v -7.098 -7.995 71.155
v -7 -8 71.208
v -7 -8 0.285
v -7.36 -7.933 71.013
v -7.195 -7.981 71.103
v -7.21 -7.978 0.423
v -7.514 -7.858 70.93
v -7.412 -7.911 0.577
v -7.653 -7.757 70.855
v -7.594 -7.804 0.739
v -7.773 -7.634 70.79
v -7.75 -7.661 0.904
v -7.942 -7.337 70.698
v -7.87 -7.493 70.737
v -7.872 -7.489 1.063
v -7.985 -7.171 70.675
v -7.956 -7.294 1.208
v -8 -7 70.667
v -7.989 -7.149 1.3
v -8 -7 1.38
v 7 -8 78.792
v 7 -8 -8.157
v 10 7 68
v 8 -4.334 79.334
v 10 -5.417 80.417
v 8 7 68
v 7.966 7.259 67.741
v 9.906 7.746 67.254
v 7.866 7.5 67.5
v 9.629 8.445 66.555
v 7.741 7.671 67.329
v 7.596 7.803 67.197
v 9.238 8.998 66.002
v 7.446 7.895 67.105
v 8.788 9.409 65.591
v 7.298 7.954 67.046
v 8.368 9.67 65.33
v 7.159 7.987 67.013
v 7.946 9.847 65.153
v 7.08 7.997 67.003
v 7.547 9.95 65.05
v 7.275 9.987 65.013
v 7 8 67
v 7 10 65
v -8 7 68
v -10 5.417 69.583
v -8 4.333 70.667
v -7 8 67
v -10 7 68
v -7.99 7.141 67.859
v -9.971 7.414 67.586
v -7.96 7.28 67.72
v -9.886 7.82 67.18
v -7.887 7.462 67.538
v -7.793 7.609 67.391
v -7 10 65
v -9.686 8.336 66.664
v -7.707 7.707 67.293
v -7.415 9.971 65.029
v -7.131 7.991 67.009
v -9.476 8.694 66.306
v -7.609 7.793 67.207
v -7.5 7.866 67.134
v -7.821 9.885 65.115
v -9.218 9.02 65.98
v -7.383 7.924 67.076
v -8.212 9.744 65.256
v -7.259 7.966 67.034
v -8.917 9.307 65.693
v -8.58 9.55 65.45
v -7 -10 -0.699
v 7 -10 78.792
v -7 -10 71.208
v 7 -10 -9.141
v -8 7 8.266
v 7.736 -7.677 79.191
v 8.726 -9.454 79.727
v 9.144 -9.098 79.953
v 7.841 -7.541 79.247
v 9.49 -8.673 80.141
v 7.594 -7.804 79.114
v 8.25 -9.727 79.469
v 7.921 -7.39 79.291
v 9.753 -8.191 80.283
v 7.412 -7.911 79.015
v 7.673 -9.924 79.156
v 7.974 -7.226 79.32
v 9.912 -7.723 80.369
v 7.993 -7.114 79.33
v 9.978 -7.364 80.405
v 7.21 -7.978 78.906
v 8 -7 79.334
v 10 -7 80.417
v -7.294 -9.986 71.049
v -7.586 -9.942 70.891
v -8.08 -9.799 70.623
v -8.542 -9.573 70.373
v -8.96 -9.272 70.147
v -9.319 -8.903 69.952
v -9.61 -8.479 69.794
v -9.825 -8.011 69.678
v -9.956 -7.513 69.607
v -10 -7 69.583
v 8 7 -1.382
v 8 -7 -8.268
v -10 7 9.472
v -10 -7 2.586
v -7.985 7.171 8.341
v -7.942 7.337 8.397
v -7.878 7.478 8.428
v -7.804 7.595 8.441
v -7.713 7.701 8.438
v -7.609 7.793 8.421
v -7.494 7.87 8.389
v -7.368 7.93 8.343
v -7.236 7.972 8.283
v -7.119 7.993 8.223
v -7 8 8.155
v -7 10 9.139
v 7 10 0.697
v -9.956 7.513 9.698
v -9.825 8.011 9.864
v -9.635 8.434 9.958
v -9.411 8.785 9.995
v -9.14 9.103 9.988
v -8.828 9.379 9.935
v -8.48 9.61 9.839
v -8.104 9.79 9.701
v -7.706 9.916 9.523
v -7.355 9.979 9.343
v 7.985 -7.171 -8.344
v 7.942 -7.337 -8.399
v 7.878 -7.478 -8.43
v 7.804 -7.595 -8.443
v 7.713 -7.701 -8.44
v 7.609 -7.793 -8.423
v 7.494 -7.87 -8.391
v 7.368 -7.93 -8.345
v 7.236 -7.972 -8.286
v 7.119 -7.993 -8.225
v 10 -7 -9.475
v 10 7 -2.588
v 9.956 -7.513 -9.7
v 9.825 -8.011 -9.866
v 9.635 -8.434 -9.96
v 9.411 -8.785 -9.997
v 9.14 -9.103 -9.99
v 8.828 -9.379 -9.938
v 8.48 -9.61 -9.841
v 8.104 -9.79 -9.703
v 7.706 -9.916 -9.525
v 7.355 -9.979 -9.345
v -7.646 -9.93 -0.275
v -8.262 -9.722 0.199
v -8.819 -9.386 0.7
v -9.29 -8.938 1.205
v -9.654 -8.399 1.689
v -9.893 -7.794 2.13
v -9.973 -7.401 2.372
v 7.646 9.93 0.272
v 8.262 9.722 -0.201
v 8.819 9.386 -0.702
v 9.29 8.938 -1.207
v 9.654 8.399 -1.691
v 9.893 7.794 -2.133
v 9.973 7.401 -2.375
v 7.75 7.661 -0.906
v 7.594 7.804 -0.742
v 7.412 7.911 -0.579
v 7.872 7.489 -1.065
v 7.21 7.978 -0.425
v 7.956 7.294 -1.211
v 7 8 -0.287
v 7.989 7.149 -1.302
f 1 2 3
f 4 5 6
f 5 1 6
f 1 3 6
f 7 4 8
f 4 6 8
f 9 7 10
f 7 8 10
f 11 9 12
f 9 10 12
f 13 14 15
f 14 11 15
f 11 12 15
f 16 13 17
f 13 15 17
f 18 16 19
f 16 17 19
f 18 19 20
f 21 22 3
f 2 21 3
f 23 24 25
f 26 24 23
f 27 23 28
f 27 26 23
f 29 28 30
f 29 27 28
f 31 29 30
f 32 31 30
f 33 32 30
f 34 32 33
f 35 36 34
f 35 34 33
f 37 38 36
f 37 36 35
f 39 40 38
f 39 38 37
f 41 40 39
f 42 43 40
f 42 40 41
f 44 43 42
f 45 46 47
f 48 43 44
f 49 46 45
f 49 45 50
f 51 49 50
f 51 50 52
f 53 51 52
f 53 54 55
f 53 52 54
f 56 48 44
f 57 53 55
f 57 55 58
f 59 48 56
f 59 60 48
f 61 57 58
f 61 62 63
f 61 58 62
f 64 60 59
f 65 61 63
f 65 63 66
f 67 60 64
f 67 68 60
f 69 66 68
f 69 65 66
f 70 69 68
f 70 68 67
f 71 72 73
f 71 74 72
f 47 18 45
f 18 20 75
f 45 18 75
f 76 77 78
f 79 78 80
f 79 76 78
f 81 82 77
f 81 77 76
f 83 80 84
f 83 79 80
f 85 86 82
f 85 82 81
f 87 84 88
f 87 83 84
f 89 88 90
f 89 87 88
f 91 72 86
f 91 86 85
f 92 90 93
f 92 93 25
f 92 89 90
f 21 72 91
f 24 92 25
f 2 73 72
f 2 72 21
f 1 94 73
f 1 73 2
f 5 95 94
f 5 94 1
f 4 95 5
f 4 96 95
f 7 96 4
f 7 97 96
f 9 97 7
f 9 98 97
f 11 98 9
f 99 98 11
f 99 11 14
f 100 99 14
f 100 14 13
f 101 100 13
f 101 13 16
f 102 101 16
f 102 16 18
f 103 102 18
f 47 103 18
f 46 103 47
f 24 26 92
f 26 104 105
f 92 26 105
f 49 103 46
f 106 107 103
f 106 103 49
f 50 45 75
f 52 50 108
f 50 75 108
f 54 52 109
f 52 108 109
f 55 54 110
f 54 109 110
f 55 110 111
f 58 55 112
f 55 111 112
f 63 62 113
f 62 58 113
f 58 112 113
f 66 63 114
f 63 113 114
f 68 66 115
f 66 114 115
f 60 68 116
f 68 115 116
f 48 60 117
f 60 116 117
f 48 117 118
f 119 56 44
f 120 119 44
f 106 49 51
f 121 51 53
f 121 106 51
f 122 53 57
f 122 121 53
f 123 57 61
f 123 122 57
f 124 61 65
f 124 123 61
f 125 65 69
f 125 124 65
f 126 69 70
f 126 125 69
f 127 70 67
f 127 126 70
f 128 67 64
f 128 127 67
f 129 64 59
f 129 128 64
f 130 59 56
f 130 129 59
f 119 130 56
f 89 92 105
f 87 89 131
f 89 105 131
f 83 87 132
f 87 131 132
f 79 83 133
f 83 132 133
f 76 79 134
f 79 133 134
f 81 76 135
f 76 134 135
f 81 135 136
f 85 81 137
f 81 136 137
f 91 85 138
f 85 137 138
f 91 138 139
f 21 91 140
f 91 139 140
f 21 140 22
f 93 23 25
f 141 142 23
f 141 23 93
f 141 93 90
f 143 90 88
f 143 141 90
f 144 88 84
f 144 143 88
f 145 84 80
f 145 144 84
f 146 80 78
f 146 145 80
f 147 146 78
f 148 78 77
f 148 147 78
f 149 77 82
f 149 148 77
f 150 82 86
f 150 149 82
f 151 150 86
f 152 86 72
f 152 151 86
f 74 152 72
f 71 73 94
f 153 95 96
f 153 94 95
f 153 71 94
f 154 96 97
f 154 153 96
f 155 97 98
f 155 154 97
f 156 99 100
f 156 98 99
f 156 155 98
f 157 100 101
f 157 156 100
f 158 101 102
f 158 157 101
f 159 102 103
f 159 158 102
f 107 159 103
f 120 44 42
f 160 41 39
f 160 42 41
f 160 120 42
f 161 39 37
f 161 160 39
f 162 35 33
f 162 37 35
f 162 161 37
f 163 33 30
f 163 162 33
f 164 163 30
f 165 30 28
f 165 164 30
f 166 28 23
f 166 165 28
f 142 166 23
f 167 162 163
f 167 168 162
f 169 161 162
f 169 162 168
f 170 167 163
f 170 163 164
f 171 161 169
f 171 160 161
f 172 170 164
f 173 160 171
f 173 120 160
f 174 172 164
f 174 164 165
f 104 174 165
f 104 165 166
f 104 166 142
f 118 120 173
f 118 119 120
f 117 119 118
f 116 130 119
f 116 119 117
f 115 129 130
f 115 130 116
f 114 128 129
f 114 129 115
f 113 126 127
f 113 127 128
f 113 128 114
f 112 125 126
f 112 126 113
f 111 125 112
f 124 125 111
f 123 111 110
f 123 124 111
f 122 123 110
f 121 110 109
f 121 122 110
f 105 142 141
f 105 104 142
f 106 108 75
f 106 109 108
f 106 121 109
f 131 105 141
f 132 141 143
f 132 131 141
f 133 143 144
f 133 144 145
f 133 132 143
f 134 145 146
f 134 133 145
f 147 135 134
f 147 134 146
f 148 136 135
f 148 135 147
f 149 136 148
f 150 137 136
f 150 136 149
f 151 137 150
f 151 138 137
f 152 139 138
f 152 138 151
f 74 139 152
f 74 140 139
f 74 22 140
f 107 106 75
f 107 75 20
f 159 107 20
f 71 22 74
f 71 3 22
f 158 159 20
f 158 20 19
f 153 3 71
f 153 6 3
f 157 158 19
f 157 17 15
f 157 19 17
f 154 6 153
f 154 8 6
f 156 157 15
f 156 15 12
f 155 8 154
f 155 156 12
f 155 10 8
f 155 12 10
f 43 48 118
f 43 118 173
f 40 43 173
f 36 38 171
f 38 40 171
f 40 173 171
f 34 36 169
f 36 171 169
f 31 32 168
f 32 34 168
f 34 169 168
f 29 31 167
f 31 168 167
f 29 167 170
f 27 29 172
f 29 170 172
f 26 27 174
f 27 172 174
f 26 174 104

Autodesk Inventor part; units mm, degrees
ref_plane "Start Plane" through (0, 0, -10.9503) normal (0, 0, 1) x (1, 0, 0)
ref_plane "End Plane" through (0, 0, 80.417) normal (0, 0, 1) x (1, 0, 0)
sketch "Sketch" plane through (0, 0, 0) normal (0, 0, 1) x (1, 0, 0)
  line L0 (-10, -7) -> (-10, 7)
  line L1 (-7, 10) -> (7, 10)
  line L2 (10, 7) -> (10, -7)
  line L3 (7, -10) -> (-7, -10)
  arc A0 (-10, -7) -> (-7, -10) centre (-7, -7) ccw
  arc A1 (-7, 10) -> (-10, 7) centre (-7, 7) ccw
  arc A2 (10, 7) -> (7, 10) centre (7, 7) ccw
  arc A3 (7, -10) -> (10, -7) centre (7, -7) ccw
  arc A4 (-7, 8) -> (-8, 7) centre (-7, 7) ccw
  line L4 (-7, 8) -> (7, 8)
  arc A5 (8, 7) -> (7, 8) centre (7, 7) ccw
  line L5 (8, 7) -> (8, -7)
  arc A6 (7, -8) -> (8, -7) centre (7, -7) ccw
  line L6 (7, -8) -> (-7, -8)
  arc A7 (-8, -7) -> (-7, -8) centre (-7, -7) ccw
  line L7 (-8, -7) -> (-8, 7)
  line L8 (0, 14.8698) -> (0, -14.8698) construction
  line L9 (-14.8698, 0) -> (14.8698, 0) construction
  dimension "d7" = 3
  dimension "d10" = 20
  dimension "d11" = 20
  dimension "d12" = 2
  dimension "d15" = 10
  dimension "d16" = 10
extrude "Body" add sketch "Sketch" along normal up to surface (91.3673 mm away) from surface at -10.9503
sketch "Sketch3" plane through (0, 0, 0) normal (0, 0, 1) x (1, 0, 0)
  line L0 (0, 0) -> (10, 0)
ref_plane "Work Plane3" through (0, 0, 0) normal (0, -1, 0) x (1, 0, 0)
sketch "Sketch4" plane through (0, 0, 0) normal (0, -1, 0) x (1, 0, 0)
  line L0 (-2, -10.9503) -> (12, -10.9503)
  line L1 (-2, 80.417) -> (12, 80.417)
  dimension "d18" = 91.3673
ref_plane "Work Plane4" through (0, -10, 85) normal (0, 0.7071, 0.7071) x (1, 0, 0)
split "Split1" plane through (0, -10, 85) removes the side toward (0, 0.7071, 0.7071)
ref_plane "Work Plane5" through (9.9561, -8.1221, -10) normal (-0.4759, 0.3882, -0.7892) x (-0.0742, 0.8764, 0.4759)
split "Split2" plane through (9.9561, -8.1221, -10) removes the side toward (-0.4759, 0.3882, -0.7892)
ref_plane "Work Plane6" through (10, 0, 80.417) normal (-0.4763, 0, 0.8793) x (0.8793, 0, 0.4763)
split "Split3" plane through (10, 0, 80.417) removes the side toward (-0.4763, 0, 0.8793)
equation "\"d7\" = G_IR"
equation "\"d10\" = G_H"
equation "\"d11\" = G_W"
equation "\"d12\" = G_T"
equation "\"d15\" = 0.5 * d10"
equation "\"d16\" = 0.5 * d11"
equation "\"d3\" = G_L"
equation "\"G_W\" = 20"
equation "\"G_H\" = 20"
equation "\"G_T\" = 2"
equation "\"G_IR\" = 3"
equation "\"G_L\" = 90.40511"
equation "\"G_OFFSET_START\" = 10.95031"
equation "\"G_OFFSET_END\" = 5.41698"
equation "\"d13\" = -G_OFFSET_START"
equation "\"d14\" = G_OFFSET_END + B_L"
equation "\"B_L\" = 75"
properties part number "ISO 12633-2 - 20x20x2 - 90.41" material "Steel, Mild"
